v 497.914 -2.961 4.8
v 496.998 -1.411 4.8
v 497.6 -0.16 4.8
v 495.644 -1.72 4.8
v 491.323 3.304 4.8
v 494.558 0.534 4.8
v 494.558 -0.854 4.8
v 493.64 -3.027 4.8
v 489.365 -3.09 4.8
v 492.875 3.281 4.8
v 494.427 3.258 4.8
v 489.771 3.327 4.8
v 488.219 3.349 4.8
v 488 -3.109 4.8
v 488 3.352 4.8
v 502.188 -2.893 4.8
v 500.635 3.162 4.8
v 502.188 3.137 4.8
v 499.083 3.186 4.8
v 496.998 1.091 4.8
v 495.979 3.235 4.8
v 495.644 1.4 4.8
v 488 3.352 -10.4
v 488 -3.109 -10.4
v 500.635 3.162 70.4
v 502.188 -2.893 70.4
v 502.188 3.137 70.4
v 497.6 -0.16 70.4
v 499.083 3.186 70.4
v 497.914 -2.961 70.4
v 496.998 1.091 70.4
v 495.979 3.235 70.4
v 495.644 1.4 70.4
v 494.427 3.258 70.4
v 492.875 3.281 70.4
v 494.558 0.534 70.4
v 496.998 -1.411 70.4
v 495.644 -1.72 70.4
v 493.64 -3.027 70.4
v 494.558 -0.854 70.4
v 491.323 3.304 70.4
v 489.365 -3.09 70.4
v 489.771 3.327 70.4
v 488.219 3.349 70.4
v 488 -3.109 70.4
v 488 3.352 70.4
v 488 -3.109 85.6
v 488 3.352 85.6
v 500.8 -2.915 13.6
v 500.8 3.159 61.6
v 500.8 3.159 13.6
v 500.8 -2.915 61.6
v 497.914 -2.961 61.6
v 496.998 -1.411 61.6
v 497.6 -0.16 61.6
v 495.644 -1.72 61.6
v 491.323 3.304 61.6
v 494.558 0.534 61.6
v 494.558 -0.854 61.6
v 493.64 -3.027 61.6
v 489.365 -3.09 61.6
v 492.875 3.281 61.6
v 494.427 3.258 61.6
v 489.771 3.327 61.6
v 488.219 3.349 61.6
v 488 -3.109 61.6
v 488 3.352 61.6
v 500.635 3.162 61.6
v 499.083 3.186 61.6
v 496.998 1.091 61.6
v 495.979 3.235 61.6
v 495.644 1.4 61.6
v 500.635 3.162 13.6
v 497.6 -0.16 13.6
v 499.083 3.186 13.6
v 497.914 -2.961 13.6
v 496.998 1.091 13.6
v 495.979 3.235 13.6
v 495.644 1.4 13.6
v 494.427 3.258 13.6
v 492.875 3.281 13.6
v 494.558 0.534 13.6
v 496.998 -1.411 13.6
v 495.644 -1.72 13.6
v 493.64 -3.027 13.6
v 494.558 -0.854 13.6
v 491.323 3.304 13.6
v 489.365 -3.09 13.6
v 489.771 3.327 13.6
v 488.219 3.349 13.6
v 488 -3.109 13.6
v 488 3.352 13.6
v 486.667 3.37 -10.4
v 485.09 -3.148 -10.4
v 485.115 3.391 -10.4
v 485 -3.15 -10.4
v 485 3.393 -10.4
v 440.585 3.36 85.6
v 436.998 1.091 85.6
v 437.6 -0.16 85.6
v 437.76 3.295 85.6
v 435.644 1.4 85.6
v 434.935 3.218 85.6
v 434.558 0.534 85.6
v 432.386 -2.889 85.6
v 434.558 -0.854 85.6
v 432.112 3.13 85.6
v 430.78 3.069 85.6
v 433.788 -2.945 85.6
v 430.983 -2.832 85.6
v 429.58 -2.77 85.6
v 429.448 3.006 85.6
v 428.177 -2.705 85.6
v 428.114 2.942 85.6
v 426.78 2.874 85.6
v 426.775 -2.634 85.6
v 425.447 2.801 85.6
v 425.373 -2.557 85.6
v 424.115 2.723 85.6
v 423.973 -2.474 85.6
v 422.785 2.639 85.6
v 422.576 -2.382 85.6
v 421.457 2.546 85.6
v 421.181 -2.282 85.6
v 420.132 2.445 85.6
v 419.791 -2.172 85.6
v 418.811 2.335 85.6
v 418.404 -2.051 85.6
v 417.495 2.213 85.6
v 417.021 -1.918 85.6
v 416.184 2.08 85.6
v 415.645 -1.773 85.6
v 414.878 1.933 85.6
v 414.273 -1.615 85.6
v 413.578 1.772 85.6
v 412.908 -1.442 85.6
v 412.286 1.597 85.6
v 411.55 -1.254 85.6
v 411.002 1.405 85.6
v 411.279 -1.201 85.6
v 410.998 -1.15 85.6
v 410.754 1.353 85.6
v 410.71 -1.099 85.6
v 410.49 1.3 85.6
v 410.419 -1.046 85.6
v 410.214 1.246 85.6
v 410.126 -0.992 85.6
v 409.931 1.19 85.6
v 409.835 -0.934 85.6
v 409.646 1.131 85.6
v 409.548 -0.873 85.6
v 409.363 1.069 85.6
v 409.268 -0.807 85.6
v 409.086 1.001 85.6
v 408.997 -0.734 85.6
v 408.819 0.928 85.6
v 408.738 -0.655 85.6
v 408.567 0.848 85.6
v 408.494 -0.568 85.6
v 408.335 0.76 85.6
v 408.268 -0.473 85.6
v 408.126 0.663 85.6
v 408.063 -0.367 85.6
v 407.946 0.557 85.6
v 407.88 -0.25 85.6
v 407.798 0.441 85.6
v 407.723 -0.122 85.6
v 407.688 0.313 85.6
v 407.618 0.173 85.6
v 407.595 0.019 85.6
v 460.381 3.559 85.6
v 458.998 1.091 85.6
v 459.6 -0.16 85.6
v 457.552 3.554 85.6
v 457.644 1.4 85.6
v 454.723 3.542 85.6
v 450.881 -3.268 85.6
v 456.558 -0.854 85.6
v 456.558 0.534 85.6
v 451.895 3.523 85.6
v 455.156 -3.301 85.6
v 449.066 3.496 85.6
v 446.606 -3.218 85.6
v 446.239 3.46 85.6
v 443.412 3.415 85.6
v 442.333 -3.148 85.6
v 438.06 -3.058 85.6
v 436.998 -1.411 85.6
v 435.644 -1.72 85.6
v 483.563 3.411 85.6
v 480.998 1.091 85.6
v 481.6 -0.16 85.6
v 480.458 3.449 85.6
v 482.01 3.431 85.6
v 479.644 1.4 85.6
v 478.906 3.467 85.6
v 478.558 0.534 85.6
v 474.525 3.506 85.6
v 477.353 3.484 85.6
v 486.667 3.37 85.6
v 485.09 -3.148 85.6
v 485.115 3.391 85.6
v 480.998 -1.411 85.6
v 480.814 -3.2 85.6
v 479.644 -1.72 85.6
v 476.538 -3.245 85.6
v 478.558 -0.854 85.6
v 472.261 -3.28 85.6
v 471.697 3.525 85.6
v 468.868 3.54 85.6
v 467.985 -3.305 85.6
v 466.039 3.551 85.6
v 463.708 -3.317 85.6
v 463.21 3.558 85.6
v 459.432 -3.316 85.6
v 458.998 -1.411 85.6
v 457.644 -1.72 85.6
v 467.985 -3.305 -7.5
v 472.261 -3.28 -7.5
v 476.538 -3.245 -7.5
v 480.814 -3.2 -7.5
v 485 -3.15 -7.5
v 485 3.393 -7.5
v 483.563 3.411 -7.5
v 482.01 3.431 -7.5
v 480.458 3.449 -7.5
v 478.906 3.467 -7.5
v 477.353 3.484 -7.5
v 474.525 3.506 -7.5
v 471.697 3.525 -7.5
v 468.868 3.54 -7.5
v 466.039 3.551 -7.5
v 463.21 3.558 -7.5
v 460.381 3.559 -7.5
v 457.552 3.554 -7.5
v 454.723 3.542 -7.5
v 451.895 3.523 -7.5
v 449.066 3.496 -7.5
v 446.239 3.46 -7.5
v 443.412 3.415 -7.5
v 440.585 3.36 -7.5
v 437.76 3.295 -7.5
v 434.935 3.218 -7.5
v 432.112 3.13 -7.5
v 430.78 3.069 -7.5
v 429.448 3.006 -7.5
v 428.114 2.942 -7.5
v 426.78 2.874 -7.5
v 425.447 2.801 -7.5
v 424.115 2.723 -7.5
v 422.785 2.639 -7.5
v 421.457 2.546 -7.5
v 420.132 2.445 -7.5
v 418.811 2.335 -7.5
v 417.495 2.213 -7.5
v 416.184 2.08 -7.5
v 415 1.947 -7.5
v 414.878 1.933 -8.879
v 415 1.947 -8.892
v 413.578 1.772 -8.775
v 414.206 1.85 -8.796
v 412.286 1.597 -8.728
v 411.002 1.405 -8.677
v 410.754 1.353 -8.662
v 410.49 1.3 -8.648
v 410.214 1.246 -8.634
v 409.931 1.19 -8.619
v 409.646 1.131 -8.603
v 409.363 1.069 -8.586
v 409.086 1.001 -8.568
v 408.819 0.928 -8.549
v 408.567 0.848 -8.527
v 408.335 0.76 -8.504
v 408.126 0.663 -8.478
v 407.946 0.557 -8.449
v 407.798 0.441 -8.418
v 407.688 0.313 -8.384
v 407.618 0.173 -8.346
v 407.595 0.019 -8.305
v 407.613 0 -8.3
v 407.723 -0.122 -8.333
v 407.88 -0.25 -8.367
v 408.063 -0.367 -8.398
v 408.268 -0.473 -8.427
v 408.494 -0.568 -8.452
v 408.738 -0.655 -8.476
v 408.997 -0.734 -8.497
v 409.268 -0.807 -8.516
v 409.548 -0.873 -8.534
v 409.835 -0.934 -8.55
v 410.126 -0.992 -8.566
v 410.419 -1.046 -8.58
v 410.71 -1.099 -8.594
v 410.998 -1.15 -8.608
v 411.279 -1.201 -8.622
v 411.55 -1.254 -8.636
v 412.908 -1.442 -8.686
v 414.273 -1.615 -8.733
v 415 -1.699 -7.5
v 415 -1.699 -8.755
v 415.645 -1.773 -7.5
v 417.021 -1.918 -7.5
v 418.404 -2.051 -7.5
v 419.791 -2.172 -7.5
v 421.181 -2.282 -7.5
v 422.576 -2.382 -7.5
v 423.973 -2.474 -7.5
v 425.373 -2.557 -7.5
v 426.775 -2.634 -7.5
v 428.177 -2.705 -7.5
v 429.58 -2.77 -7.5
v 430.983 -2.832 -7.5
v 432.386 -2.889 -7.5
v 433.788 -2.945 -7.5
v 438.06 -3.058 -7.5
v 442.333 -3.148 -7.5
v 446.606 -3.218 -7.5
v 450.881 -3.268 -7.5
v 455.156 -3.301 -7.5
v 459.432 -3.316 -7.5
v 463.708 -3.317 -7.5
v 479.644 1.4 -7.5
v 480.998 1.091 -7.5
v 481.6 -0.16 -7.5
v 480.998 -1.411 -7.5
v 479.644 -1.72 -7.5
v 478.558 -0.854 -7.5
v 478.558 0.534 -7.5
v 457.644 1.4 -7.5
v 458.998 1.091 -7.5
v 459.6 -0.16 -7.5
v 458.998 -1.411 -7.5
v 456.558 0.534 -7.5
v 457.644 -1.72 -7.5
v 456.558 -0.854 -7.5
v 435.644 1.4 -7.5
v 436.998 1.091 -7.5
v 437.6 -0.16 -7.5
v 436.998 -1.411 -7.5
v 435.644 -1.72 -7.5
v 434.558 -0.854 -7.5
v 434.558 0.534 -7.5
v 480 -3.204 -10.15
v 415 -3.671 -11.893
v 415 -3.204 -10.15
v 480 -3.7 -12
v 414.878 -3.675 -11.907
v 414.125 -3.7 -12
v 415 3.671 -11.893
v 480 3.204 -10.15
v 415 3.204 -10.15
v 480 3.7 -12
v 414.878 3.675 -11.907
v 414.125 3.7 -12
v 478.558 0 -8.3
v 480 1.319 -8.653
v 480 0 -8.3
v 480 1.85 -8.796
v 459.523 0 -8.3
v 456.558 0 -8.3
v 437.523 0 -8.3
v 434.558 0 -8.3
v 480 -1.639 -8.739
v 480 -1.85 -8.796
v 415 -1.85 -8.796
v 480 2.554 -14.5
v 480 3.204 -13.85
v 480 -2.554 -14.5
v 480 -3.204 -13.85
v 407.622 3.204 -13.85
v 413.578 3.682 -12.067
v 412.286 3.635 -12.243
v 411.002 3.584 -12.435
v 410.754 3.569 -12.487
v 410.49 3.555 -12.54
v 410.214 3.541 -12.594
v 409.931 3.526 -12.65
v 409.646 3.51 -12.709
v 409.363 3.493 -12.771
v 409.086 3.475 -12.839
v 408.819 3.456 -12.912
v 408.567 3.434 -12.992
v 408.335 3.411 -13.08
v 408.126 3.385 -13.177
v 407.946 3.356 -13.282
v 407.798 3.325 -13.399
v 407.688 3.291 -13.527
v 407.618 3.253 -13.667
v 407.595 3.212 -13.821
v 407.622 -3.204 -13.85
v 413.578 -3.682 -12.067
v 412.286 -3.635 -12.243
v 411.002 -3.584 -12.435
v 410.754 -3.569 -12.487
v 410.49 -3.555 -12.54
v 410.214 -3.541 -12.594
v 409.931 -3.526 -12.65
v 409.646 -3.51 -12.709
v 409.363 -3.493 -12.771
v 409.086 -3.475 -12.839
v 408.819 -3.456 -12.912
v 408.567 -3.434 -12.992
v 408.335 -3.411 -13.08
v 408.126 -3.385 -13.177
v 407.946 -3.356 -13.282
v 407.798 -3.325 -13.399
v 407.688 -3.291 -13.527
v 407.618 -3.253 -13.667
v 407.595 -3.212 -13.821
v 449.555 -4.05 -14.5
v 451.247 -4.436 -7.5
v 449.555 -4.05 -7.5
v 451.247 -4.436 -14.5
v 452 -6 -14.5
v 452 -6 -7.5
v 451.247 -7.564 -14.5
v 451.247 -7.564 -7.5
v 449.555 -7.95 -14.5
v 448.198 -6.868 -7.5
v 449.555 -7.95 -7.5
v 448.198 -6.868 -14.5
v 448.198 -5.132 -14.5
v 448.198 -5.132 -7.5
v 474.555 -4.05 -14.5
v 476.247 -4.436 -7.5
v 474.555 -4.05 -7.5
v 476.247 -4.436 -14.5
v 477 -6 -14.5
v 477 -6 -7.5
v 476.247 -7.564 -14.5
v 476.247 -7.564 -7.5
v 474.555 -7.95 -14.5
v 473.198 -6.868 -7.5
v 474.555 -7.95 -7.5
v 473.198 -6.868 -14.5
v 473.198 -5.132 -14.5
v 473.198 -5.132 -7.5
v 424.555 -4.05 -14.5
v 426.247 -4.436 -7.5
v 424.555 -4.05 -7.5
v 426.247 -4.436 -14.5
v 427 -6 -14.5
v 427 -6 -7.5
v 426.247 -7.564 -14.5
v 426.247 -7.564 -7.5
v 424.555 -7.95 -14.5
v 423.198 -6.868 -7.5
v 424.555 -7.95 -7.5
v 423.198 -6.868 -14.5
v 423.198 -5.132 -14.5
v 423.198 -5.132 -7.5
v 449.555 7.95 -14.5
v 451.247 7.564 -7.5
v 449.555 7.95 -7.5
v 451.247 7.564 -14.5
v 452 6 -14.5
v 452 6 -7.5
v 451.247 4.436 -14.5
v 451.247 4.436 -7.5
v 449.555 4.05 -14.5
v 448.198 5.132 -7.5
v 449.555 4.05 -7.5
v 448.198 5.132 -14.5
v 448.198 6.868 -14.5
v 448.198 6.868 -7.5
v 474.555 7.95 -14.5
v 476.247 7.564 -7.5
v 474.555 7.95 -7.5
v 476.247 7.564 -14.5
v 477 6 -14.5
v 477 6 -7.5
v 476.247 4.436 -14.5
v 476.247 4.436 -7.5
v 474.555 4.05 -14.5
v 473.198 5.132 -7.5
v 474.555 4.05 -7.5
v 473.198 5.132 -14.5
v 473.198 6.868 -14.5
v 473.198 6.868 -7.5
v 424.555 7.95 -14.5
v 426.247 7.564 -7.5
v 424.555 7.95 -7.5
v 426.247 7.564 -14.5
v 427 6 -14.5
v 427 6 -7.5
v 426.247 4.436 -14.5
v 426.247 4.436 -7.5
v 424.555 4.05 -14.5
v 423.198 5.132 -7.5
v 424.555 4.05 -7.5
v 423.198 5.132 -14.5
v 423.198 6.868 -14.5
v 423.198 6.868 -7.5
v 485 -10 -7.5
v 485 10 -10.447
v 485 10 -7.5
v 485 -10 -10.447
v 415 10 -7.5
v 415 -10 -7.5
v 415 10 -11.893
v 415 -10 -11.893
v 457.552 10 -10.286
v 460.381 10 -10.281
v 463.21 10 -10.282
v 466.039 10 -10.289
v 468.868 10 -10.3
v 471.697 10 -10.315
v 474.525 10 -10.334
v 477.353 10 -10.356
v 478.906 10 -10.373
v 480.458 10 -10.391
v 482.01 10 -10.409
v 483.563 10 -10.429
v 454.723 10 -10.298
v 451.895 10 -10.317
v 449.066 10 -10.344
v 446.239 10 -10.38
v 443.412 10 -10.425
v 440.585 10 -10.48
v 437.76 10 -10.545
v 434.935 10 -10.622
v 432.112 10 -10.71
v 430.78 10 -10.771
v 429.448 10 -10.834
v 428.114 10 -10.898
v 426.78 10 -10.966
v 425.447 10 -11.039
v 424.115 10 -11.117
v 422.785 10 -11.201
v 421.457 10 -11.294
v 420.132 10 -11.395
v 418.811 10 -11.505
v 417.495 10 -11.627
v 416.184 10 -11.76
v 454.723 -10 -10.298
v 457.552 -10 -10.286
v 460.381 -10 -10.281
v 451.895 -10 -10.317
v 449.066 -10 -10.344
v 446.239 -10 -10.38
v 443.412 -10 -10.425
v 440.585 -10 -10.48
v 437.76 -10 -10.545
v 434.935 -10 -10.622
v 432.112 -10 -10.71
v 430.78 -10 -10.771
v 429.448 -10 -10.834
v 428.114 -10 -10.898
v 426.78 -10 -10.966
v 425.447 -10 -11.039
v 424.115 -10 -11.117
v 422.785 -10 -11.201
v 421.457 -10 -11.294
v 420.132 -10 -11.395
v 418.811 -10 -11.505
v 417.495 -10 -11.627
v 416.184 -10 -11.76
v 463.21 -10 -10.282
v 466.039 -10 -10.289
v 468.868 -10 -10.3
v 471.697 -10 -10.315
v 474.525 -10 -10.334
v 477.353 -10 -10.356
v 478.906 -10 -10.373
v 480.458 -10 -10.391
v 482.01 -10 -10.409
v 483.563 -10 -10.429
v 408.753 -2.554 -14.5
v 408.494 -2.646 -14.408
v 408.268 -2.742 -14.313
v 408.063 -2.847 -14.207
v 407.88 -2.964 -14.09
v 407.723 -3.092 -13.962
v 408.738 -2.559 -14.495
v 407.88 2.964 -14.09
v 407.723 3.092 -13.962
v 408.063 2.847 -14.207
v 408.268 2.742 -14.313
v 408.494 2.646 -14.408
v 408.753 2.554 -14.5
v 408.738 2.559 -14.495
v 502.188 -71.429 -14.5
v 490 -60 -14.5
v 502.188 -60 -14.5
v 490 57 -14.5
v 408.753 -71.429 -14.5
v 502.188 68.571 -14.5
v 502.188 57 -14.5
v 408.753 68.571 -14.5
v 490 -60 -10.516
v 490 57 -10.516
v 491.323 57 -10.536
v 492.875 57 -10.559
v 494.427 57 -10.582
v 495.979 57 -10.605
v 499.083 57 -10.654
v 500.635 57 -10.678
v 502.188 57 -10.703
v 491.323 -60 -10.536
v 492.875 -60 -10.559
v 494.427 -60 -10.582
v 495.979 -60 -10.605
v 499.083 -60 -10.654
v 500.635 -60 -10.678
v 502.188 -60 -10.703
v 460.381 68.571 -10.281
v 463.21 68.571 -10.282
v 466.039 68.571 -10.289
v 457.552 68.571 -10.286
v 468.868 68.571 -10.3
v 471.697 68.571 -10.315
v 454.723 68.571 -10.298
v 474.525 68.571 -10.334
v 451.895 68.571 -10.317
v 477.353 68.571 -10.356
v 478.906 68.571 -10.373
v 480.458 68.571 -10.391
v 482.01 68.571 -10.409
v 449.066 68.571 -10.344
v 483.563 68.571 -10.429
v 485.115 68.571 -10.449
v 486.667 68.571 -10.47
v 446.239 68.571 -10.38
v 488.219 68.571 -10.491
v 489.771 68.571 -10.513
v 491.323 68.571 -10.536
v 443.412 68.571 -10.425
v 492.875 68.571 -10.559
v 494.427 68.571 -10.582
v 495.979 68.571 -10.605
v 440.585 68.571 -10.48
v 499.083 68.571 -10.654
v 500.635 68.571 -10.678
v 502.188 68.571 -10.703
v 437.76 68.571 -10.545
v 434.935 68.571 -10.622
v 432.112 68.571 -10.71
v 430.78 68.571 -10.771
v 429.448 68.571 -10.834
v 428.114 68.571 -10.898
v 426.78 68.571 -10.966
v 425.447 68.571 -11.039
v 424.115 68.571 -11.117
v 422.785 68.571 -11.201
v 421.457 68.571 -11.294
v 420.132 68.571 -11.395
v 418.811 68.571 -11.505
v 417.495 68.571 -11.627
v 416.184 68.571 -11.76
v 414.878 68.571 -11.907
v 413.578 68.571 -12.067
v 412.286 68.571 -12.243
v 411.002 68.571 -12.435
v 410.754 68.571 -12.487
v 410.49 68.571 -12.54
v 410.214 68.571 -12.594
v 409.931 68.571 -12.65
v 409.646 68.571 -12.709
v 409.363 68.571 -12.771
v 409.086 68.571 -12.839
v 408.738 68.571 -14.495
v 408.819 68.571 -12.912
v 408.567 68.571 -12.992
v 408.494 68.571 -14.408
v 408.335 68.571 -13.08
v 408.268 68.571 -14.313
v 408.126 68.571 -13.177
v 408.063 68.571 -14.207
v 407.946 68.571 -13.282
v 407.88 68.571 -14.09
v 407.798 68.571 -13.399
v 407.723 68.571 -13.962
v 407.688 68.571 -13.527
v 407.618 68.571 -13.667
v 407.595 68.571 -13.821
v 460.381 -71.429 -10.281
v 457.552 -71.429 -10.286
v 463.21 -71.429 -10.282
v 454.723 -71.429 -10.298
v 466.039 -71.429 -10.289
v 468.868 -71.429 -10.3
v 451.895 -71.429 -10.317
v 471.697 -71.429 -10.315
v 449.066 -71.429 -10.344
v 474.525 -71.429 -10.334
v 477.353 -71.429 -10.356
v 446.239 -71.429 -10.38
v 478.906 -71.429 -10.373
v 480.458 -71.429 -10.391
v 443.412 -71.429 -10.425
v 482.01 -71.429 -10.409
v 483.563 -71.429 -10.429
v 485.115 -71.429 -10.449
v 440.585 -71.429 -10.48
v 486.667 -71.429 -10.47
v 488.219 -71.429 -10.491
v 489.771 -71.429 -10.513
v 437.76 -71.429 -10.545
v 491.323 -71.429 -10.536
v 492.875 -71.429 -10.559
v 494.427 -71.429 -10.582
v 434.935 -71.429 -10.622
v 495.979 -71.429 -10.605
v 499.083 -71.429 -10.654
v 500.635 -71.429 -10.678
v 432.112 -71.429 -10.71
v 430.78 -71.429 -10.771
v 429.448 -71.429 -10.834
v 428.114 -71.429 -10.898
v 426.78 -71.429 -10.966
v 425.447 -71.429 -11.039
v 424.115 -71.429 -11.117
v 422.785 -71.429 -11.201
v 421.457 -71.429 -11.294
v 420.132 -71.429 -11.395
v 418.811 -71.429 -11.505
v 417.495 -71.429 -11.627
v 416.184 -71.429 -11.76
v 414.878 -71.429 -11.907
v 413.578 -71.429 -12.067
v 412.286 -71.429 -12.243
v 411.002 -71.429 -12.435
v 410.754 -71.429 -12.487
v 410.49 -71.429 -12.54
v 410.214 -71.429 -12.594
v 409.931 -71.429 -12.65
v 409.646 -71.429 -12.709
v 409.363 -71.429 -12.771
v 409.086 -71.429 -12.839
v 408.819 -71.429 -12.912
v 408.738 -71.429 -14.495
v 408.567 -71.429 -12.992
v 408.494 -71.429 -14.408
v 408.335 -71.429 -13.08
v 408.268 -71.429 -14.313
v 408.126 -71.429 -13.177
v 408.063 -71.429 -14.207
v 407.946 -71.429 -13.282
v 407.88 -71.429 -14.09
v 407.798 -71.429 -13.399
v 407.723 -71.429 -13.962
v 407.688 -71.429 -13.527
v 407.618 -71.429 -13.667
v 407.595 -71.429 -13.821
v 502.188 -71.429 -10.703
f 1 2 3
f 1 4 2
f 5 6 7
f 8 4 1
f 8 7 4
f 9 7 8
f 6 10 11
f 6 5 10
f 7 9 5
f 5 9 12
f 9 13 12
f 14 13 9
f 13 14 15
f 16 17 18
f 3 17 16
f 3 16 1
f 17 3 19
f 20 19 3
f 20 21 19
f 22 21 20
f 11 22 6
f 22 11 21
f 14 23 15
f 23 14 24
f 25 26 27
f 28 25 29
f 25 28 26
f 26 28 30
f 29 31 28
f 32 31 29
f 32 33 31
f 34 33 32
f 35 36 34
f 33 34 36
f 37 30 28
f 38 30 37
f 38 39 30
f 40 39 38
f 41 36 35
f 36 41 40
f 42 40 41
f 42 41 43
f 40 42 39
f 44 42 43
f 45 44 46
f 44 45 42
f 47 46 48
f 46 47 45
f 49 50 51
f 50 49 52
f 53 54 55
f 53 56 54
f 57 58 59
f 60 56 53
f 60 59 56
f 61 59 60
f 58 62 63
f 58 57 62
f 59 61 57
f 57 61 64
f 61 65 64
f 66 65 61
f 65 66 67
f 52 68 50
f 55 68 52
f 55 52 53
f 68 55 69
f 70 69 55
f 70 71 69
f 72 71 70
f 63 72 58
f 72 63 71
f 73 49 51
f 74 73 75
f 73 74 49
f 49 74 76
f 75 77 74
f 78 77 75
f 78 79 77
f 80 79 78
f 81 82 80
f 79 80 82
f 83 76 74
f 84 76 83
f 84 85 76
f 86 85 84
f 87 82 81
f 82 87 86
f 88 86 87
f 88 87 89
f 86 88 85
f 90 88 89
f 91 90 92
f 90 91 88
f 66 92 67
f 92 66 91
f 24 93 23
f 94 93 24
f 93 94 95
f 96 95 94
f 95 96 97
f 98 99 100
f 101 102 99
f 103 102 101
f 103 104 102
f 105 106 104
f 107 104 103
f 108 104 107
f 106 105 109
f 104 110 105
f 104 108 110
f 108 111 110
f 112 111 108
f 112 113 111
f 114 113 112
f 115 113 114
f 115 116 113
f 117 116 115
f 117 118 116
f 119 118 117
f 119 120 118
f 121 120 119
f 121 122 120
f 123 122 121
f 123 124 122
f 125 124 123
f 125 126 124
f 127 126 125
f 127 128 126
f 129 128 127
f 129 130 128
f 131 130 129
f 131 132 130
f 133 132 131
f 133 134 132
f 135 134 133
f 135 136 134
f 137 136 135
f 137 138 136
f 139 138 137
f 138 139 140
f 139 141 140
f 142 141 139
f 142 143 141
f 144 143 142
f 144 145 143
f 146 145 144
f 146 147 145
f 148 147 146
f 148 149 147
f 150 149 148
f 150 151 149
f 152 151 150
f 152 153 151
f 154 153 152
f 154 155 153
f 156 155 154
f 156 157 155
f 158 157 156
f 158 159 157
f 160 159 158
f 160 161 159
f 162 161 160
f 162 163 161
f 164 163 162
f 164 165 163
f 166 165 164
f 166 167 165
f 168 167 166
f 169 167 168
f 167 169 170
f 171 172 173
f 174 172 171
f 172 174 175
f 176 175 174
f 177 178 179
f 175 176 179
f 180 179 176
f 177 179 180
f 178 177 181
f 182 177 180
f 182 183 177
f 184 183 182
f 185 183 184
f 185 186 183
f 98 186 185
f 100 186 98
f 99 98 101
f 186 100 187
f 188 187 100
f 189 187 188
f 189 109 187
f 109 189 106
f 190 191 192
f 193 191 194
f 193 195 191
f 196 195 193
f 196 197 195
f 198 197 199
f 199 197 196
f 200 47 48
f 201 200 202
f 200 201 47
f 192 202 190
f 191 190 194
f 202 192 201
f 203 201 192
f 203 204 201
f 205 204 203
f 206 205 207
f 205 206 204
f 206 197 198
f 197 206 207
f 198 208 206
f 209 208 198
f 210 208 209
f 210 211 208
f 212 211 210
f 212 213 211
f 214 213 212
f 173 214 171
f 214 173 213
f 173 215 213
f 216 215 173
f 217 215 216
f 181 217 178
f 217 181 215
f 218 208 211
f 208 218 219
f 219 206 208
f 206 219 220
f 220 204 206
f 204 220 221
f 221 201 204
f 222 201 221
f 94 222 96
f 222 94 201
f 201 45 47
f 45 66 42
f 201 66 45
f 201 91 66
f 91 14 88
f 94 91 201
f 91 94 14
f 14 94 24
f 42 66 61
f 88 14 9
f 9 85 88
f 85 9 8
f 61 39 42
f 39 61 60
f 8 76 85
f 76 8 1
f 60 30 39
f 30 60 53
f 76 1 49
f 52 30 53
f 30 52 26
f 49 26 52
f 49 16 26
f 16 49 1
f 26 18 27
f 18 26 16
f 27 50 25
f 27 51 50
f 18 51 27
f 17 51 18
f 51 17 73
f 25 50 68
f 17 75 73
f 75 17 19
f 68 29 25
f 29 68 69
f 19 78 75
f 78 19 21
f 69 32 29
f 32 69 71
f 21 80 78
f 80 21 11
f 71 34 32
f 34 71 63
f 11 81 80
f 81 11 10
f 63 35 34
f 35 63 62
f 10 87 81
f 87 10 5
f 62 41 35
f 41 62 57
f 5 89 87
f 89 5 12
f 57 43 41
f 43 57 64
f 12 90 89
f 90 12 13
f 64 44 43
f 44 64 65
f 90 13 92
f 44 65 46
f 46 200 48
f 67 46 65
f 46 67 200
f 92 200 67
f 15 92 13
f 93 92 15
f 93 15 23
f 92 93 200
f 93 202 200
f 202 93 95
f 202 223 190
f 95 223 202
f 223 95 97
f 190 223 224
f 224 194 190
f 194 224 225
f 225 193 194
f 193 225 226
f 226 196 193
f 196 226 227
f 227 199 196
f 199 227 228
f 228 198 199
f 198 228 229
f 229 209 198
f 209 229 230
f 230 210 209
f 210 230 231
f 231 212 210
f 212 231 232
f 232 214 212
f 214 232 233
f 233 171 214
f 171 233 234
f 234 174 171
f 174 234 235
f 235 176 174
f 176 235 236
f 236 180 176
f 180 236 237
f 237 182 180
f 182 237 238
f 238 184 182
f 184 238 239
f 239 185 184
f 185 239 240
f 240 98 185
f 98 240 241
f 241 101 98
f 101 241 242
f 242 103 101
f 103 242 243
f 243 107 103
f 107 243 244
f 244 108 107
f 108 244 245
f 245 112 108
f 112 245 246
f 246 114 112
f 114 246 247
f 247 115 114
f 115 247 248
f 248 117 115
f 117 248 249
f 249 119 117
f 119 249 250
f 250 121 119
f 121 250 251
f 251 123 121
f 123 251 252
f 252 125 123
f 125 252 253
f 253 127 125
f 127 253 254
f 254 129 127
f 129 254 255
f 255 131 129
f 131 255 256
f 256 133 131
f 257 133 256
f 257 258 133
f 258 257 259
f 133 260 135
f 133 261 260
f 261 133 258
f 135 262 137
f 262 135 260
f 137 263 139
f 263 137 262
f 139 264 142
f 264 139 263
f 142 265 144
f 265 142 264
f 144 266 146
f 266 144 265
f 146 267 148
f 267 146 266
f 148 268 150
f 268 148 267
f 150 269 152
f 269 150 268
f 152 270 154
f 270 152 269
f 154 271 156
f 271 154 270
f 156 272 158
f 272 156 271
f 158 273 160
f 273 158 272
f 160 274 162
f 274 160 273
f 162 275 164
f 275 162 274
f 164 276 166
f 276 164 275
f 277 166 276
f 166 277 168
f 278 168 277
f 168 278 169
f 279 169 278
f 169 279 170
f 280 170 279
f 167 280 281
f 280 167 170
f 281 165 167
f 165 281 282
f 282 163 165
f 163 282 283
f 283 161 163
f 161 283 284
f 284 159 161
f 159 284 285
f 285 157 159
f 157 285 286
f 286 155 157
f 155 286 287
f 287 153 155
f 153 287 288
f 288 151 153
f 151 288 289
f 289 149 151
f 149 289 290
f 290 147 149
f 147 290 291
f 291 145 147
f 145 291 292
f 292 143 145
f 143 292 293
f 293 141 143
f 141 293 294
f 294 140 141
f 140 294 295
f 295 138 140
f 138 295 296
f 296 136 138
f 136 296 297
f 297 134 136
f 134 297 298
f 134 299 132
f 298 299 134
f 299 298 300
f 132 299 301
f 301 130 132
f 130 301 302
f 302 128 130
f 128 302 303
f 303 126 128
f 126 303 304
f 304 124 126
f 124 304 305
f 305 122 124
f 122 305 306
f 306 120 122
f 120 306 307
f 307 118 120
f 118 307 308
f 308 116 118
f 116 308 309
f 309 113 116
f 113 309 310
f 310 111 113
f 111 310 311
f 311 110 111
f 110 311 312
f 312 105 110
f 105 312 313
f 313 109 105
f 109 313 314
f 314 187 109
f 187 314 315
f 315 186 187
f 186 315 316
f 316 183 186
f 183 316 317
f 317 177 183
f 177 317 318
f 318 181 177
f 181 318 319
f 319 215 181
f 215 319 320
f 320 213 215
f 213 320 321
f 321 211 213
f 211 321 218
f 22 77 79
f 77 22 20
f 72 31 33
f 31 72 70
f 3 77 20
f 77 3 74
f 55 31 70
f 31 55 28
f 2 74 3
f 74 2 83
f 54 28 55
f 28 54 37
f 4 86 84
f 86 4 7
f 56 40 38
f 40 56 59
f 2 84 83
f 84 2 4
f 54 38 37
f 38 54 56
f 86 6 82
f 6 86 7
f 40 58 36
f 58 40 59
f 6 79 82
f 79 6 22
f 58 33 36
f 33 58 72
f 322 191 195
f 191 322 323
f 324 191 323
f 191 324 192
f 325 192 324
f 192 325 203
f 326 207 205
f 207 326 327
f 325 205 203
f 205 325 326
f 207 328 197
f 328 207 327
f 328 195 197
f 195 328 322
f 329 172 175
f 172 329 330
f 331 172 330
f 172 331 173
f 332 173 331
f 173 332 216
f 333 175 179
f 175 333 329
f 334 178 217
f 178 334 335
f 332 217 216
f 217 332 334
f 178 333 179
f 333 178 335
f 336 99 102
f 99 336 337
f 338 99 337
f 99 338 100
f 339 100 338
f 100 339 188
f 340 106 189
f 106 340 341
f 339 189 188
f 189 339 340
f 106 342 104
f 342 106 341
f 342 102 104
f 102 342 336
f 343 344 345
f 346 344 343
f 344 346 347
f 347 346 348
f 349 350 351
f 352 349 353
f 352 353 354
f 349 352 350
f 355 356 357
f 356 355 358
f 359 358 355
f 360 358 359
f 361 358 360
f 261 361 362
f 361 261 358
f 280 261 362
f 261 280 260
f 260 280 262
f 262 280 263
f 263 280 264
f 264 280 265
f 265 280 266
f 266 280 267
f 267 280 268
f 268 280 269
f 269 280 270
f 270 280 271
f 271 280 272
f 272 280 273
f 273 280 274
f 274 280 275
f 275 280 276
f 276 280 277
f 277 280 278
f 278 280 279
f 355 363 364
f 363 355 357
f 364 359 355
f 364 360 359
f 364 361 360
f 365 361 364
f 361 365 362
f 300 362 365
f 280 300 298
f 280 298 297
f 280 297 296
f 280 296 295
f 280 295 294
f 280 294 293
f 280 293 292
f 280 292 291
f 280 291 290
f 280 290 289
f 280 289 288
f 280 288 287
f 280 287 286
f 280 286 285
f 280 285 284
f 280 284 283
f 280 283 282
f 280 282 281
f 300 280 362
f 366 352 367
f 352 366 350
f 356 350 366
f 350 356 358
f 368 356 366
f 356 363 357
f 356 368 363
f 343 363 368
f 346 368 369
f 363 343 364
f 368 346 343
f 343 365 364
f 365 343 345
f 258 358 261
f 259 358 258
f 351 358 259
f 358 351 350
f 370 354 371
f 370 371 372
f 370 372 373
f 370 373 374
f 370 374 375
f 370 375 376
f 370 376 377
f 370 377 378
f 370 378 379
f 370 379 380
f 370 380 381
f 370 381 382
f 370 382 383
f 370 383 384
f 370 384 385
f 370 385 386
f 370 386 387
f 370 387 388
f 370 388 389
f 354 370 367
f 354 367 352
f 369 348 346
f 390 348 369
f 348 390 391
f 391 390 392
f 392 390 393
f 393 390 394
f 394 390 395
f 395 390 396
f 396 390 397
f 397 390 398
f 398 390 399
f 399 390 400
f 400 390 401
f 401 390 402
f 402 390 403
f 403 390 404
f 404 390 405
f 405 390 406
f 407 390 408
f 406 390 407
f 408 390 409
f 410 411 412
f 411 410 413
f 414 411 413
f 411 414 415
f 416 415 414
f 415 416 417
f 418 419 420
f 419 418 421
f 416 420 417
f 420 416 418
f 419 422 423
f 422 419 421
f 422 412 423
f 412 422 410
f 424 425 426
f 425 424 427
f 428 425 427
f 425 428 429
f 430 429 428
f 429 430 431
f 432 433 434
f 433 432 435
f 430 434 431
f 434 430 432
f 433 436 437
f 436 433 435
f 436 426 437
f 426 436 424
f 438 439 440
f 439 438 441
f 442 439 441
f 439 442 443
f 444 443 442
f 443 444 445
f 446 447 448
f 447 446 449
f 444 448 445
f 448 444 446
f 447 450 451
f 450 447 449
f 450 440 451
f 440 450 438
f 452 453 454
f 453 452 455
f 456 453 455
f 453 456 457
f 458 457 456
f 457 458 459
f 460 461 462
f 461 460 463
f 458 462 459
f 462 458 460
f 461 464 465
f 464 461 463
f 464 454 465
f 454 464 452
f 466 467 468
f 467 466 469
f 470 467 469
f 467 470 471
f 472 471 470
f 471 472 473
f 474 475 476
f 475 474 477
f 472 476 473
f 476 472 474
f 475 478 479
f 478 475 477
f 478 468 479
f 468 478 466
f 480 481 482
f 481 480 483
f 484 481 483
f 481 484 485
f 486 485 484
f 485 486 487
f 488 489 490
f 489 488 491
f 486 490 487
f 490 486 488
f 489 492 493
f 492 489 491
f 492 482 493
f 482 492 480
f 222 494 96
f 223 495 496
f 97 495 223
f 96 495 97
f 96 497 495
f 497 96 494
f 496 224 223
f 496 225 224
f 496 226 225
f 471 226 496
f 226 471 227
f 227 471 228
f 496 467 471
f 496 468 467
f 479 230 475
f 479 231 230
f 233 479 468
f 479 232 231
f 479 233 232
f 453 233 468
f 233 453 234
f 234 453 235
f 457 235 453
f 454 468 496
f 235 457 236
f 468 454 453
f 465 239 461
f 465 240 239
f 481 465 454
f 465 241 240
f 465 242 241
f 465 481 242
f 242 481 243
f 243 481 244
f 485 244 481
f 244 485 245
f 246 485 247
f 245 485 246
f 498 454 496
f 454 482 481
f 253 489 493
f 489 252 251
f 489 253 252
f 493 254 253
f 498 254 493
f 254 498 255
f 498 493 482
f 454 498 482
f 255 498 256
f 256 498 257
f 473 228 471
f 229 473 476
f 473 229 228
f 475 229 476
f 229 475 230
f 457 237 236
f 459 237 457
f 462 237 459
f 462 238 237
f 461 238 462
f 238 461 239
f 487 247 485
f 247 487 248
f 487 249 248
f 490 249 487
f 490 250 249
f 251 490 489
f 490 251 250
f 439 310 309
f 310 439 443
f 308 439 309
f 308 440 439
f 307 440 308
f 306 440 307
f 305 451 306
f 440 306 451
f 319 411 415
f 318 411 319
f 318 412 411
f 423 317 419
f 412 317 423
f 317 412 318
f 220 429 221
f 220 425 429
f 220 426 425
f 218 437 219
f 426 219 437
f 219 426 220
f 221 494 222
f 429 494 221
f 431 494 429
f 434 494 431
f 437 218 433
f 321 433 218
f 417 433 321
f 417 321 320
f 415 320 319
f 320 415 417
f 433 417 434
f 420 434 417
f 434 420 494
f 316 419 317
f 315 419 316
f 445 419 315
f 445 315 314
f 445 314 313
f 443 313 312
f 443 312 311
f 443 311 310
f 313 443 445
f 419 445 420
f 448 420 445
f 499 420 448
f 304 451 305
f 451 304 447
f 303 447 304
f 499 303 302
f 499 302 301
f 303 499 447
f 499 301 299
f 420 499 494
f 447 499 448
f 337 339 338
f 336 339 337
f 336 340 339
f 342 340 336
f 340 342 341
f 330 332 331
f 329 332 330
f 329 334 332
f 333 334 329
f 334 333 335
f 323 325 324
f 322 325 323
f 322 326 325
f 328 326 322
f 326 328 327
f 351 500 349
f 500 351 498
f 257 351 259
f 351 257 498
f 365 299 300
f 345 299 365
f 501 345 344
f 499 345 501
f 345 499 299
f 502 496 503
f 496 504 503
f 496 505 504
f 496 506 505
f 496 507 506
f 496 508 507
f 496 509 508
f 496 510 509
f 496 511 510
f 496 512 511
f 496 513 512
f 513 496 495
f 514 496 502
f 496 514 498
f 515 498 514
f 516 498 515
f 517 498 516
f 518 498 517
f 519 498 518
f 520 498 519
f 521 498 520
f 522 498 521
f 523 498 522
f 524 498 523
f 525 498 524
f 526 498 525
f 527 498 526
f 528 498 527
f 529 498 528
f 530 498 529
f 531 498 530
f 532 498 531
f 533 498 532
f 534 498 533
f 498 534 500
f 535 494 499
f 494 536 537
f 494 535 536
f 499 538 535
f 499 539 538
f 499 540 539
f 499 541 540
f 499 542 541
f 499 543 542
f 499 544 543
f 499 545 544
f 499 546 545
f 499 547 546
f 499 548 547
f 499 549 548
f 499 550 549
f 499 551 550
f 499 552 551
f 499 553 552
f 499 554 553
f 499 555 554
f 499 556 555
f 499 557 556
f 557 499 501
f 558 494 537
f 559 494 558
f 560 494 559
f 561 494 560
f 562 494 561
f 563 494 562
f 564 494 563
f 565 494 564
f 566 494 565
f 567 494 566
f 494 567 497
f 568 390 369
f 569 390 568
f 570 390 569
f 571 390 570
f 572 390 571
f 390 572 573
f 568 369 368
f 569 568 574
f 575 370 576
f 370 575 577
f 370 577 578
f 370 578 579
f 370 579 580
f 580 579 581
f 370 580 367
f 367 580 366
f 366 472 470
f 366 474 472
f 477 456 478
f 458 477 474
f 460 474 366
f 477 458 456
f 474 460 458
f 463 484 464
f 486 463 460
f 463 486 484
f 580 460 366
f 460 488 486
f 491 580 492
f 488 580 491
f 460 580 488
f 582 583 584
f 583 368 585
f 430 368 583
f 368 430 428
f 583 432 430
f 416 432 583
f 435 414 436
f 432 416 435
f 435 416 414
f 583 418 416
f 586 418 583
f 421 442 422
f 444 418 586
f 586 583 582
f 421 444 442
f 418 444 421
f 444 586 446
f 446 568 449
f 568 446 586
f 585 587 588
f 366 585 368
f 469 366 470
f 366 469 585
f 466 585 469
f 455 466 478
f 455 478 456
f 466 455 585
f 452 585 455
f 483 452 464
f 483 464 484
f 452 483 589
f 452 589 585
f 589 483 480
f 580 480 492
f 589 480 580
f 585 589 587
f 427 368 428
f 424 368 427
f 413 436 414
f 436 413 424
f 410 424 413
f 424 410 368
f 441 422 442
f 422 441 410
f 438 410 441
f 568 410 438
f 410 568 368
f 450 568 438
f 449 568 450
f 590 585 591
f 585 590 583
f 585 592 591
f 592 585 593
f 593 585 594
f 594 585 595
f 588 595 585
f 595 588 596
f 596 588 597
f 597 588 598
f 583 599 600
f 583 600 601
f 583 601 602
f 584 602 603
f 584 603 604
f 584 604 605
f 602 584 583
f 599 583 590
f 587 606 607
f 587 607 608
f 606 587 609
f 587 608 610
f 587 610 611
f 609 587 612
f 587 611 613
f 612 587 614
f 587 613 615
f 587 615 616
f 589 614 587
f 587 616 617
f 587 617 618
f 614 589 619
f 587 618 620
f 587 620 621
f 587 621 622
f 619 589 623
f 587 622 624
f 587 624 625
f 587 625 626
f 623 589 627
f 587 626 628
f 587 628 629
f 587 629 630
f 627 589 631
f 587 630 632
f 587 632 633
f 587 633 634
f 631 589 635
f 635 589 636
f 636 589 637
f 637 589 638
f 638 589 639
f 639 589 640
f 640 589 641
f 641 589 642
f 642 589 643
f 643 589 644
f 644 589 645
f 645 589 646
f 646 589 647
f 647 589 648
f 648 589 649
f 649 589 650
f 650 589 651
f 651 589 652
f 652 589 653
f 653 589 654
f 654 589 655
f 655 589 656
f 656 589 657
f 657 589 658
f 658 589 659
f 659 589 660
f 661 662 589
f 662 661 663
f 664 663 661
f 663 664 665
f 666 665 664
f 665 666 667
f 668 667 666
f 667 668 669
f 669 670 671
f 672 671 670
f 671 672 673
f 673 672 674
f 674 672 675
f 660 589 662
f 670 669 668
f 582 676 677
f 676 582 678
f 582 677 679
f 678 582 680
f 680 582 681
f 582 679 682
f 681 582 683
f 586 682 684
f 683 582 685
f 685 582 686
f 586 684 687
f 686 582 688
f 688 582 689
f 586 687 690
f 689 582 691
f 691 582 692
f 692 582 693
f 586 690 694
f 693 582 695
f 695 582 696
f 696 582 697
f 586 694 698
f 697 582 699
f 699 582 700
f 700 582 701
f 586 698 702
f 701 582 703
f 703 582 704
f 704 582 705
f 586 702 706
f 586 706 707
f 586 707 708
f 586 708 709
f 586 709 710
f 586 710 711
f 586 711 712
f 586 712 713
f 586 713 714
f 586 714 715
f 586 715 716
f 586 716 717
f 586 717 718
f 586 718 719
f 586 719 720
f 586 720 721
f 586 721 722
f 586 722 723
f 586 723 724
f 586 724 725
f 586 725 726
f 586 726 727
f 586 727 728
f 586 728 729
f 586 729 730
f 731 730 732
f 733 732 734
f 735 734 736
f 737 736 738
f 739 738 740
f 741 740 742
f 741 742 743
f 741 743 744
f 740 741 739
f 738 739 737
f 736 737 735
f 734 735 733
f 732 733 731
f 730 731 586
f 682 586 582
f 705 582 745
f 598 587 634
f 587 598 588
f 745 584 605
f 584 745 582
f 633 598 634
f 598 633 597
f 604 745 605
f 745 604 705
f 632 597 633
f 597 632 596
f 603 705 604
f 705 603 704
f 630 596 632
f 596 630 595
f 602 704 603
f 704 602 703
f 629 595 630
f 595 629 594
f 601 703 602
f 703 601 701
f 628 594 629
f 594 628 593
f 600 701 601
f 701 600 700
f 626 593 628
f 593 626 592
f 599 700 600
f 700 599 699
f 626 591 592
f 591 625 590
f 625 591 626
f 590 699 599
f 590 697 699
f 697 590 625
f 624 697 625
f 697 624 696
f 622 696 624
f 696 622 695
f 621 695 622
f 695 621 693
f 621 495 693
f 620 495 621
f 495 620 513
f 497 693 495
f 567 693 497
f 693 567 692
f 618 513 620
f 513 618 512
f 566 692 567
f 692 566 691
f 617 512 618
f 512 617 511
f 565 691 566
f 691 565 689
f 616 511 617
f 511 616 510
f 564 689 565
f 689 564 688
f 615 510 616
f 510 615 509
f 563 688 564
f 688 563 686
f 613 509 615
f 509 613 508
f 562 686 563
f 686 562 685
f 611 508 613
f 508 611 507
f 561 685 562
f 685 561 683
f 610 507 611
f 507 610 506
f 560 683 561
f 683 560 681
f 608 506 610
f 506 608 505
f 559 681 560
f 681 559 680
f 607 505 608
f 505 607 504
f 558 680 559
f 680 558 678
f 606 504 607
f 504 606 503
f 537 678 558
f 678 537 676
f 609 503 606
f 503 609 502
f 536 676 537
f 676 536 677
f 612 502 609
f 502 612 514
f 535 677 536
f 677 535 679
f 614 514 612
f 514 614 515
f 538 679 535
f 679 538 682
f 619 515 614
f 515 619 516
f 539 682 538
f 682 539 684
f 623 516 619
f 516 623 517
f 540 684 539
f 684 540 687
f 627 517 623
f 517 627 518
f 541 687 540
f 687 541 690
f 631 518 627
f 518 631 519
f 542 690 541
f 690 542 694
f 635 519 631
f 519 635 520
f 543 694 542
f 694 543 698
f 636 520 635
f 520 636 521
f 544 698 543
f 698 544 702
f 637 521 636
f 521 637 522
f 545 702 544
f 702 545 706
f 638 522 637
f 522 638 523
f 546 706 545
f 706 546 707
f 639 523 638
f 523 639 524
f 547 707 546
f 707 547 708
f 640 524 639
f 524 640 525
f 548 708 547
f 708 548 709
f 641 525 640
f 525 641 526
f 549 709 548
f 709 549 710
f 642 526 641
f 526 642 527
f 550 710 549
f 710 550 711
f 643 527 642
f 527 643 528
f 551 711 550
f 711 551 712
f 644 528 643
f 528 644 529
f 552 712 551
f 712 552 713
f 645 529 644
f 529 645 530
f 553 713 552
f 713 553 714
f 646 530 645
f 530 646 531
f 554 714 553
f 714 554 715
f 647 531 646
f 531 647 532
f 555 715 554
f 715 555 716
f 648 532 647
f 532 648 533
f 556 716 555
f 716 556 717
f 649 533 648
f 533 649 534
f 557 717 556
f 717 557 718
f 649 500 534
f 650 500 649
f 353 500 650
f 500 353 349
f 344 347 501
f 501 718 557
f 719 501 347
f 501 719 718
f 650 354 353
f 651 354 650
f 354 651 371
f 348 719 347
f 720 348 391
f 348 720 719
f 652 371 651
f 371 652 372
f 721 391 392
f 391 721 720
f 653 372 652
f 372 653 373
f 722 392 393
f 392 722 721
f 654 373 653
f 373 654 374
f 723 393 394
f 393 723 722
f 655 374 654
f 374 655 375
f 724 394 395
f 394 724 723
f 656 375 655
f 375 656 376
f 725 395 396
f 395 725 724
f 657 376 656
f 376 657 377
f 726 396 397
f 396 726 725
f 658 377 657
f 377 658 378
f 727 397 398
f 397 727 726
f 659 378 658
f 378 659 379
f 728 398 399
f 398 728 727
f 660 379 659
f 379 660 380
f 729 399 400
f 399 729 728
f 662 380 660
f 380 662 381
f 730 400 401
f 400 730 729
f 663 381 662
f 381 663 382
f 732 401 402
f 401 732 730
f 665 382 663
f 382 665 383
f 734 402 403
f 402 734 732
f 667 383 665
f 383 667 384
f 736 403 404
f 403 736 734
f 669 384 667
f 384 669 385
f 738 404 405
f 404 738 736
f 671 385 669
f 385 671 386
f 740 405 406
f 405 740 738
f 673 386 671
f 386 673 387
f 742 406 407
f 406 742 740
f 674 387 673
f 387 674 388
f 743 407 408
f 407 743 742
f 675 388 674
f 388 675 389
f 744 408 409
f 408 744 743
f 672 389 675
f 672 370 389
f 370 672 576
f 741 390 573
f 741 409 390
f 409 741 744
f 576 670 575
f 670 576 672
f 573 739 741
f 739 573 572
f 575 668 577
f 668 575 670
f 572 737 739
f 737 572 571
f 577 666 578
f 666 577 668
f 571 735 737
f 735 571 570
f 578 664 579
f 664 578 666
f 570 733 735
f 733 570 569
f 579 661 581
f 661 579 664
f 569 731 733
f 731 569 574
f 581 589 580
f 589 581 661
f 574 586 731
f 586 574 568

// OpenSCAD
// file: tail.scad
module tail_front(){
  difference(){
  scale([0.6,0.3,0.6])
  linear_extrude(file = "tail/front.dxf",height = 200, convexity = 10);

  union(){
    translate([110,60,-1])
    cube([36,70,20]);
    translate([110,60,101])
    cube([36,70,20]);
    translate([110,60,30])
    cube([16,70,60]);

  }
}

}

module tail_back(){

  difference(){
  scale([0.6,0.3,0.6])
  scale([0.6,1,1])
  translate([120,0,0])
  linear_extrude(file = "tail/back.dxf",height = 200, convexity = 10);
  union(){
    translate([110,60,18])
    cube([22,70,120-36]);
  }
}
}

module tail_rod(){
      translate([110, 0, -12])rotate([0,90,0])cylinder(r=3.7,h=370);
}

module tail_unstranlated(){
difference(){
union(){
  tail_front();
  tail_back();
}
    translate([120,65,-1])
cylinder(r=2,h=200);

}
}

module tail(){
  difference(){
    scale(0.8) translate([500,-65.2,-13]) tail_unstranlated();
    tail_rod();
  }
}

module tail_socket(){
  difference(){
    translate([450,0,-10]) cube([70,20,5],center=true);
    union(){
      tail_rod();
      translate([450,-6,-100]) cylinder(r=2,h=400);
     translate([475,-6,-100]) cylinder(r=2,h=400);
     translate([425,-6,-100]) cylinder(r=2,h=400);
     translate([450,6,-100]) cylinder(r=2,h=400);
     translate([475,6,-100]) cylinder(r=2,h=400);
     translate([425,6,-100]) cylinder(r=2,h=400);
    }
  }
}

module tail_socket_bottom(){
  back_wheel();
  difference(){
    translate([450,0,-17]) cube([70,20,5],center=true);
    union(){
      tail_rod();
      translate([450,-6,-100]) cylinder(r=2,h=400);
     translate([475,-6,-100]) cylinder(r=2,h=400);
     translate([425,-6,-100]) cylinder(r=2,h=400);
     translate([450,6,-100]) cylinder(r=2,h=400);
     translate([475,6,-100]) cylinder(r=2,h=400);
     translate([425,6,-100]) cylinder(r=2,h=400);
    }
  }
}

module back_wheel(){
difference(){
 translate([470,0,-28]) cube([20,6,20],center=true);
 translate([470-10,-6+12,-28-20]) rotate([0,45,0]) cube([40,40,40],center=true);
}
}

module elevator_fixed(){
difference(){
  union(){
    translate([500*0.8,48/0.7,-66]) rotate([90,0,0])
    scale([0.48,0.24,0.7]) linear_extrude(file = "tail/front.dxf",height = 200, convexity = 10);
  }
  union(){
    tail_rod();
    translate([450,-6,-100]) cylinder(r=2,h=400);
    translate([475,-6,-100]) cylinder(r=2,h=400);
    translate([425,-6,-100]) cylinder(r=2,h=400);
    translate([450,6,-100]) cylinder(r=2,h=400);
    translate([475,6,-100]) cylinder(r=2,h=400);
    translate([425,6,-100]) cylinder(r=2,h=400);
    translate([150,-200,-17-5/2]) cube([1000,1000,5]);
    translate([490,-60,-100]) cube([50,117,300]);
  }
}
}

module elevator(){
  difference(){
    translate([500*0.8-3+35,48/0.7,-66]) rotate([90,0,0]) scale([0.3,0.24,0.7])
  linear_extrude(file = "tail/back.dxf",height = 200, convexity = 10);
  union(){
    translate([150,-200,-17-5/2]) cube([1000,1000,5]);
    //translate([490,-60,-100]) cube([50,117,300]);
    translate([490,-90,-100]) cube([16,31,300]);
    translate([490,-60+117+1,-100]) cube([16,297,300]);
  }
}
  
}

tail();
//tail_rod();
tail_socket();
//tail_socket_bottom();

elevator_fixed();
elevator();
// main file
use <tail.scad>;

difference(){
  difference(){
    scale(0.8) translate([500,-65.2,-13]) 
    difference(){
      tail_front();
      union(){
        translate([120,65,-1]) cylinder(r=2,h=200);
        translate([100,65,-1]) cylinder(r=2,h=200);
        translate([72.5,65,-1]) cylinder(r=2,h=200);
        translate([45,65,-1]) cylinder(r=2,h=200);

      }
    }
    tail_rod();
  }
}

tail_socket();


elevator_fixed();
